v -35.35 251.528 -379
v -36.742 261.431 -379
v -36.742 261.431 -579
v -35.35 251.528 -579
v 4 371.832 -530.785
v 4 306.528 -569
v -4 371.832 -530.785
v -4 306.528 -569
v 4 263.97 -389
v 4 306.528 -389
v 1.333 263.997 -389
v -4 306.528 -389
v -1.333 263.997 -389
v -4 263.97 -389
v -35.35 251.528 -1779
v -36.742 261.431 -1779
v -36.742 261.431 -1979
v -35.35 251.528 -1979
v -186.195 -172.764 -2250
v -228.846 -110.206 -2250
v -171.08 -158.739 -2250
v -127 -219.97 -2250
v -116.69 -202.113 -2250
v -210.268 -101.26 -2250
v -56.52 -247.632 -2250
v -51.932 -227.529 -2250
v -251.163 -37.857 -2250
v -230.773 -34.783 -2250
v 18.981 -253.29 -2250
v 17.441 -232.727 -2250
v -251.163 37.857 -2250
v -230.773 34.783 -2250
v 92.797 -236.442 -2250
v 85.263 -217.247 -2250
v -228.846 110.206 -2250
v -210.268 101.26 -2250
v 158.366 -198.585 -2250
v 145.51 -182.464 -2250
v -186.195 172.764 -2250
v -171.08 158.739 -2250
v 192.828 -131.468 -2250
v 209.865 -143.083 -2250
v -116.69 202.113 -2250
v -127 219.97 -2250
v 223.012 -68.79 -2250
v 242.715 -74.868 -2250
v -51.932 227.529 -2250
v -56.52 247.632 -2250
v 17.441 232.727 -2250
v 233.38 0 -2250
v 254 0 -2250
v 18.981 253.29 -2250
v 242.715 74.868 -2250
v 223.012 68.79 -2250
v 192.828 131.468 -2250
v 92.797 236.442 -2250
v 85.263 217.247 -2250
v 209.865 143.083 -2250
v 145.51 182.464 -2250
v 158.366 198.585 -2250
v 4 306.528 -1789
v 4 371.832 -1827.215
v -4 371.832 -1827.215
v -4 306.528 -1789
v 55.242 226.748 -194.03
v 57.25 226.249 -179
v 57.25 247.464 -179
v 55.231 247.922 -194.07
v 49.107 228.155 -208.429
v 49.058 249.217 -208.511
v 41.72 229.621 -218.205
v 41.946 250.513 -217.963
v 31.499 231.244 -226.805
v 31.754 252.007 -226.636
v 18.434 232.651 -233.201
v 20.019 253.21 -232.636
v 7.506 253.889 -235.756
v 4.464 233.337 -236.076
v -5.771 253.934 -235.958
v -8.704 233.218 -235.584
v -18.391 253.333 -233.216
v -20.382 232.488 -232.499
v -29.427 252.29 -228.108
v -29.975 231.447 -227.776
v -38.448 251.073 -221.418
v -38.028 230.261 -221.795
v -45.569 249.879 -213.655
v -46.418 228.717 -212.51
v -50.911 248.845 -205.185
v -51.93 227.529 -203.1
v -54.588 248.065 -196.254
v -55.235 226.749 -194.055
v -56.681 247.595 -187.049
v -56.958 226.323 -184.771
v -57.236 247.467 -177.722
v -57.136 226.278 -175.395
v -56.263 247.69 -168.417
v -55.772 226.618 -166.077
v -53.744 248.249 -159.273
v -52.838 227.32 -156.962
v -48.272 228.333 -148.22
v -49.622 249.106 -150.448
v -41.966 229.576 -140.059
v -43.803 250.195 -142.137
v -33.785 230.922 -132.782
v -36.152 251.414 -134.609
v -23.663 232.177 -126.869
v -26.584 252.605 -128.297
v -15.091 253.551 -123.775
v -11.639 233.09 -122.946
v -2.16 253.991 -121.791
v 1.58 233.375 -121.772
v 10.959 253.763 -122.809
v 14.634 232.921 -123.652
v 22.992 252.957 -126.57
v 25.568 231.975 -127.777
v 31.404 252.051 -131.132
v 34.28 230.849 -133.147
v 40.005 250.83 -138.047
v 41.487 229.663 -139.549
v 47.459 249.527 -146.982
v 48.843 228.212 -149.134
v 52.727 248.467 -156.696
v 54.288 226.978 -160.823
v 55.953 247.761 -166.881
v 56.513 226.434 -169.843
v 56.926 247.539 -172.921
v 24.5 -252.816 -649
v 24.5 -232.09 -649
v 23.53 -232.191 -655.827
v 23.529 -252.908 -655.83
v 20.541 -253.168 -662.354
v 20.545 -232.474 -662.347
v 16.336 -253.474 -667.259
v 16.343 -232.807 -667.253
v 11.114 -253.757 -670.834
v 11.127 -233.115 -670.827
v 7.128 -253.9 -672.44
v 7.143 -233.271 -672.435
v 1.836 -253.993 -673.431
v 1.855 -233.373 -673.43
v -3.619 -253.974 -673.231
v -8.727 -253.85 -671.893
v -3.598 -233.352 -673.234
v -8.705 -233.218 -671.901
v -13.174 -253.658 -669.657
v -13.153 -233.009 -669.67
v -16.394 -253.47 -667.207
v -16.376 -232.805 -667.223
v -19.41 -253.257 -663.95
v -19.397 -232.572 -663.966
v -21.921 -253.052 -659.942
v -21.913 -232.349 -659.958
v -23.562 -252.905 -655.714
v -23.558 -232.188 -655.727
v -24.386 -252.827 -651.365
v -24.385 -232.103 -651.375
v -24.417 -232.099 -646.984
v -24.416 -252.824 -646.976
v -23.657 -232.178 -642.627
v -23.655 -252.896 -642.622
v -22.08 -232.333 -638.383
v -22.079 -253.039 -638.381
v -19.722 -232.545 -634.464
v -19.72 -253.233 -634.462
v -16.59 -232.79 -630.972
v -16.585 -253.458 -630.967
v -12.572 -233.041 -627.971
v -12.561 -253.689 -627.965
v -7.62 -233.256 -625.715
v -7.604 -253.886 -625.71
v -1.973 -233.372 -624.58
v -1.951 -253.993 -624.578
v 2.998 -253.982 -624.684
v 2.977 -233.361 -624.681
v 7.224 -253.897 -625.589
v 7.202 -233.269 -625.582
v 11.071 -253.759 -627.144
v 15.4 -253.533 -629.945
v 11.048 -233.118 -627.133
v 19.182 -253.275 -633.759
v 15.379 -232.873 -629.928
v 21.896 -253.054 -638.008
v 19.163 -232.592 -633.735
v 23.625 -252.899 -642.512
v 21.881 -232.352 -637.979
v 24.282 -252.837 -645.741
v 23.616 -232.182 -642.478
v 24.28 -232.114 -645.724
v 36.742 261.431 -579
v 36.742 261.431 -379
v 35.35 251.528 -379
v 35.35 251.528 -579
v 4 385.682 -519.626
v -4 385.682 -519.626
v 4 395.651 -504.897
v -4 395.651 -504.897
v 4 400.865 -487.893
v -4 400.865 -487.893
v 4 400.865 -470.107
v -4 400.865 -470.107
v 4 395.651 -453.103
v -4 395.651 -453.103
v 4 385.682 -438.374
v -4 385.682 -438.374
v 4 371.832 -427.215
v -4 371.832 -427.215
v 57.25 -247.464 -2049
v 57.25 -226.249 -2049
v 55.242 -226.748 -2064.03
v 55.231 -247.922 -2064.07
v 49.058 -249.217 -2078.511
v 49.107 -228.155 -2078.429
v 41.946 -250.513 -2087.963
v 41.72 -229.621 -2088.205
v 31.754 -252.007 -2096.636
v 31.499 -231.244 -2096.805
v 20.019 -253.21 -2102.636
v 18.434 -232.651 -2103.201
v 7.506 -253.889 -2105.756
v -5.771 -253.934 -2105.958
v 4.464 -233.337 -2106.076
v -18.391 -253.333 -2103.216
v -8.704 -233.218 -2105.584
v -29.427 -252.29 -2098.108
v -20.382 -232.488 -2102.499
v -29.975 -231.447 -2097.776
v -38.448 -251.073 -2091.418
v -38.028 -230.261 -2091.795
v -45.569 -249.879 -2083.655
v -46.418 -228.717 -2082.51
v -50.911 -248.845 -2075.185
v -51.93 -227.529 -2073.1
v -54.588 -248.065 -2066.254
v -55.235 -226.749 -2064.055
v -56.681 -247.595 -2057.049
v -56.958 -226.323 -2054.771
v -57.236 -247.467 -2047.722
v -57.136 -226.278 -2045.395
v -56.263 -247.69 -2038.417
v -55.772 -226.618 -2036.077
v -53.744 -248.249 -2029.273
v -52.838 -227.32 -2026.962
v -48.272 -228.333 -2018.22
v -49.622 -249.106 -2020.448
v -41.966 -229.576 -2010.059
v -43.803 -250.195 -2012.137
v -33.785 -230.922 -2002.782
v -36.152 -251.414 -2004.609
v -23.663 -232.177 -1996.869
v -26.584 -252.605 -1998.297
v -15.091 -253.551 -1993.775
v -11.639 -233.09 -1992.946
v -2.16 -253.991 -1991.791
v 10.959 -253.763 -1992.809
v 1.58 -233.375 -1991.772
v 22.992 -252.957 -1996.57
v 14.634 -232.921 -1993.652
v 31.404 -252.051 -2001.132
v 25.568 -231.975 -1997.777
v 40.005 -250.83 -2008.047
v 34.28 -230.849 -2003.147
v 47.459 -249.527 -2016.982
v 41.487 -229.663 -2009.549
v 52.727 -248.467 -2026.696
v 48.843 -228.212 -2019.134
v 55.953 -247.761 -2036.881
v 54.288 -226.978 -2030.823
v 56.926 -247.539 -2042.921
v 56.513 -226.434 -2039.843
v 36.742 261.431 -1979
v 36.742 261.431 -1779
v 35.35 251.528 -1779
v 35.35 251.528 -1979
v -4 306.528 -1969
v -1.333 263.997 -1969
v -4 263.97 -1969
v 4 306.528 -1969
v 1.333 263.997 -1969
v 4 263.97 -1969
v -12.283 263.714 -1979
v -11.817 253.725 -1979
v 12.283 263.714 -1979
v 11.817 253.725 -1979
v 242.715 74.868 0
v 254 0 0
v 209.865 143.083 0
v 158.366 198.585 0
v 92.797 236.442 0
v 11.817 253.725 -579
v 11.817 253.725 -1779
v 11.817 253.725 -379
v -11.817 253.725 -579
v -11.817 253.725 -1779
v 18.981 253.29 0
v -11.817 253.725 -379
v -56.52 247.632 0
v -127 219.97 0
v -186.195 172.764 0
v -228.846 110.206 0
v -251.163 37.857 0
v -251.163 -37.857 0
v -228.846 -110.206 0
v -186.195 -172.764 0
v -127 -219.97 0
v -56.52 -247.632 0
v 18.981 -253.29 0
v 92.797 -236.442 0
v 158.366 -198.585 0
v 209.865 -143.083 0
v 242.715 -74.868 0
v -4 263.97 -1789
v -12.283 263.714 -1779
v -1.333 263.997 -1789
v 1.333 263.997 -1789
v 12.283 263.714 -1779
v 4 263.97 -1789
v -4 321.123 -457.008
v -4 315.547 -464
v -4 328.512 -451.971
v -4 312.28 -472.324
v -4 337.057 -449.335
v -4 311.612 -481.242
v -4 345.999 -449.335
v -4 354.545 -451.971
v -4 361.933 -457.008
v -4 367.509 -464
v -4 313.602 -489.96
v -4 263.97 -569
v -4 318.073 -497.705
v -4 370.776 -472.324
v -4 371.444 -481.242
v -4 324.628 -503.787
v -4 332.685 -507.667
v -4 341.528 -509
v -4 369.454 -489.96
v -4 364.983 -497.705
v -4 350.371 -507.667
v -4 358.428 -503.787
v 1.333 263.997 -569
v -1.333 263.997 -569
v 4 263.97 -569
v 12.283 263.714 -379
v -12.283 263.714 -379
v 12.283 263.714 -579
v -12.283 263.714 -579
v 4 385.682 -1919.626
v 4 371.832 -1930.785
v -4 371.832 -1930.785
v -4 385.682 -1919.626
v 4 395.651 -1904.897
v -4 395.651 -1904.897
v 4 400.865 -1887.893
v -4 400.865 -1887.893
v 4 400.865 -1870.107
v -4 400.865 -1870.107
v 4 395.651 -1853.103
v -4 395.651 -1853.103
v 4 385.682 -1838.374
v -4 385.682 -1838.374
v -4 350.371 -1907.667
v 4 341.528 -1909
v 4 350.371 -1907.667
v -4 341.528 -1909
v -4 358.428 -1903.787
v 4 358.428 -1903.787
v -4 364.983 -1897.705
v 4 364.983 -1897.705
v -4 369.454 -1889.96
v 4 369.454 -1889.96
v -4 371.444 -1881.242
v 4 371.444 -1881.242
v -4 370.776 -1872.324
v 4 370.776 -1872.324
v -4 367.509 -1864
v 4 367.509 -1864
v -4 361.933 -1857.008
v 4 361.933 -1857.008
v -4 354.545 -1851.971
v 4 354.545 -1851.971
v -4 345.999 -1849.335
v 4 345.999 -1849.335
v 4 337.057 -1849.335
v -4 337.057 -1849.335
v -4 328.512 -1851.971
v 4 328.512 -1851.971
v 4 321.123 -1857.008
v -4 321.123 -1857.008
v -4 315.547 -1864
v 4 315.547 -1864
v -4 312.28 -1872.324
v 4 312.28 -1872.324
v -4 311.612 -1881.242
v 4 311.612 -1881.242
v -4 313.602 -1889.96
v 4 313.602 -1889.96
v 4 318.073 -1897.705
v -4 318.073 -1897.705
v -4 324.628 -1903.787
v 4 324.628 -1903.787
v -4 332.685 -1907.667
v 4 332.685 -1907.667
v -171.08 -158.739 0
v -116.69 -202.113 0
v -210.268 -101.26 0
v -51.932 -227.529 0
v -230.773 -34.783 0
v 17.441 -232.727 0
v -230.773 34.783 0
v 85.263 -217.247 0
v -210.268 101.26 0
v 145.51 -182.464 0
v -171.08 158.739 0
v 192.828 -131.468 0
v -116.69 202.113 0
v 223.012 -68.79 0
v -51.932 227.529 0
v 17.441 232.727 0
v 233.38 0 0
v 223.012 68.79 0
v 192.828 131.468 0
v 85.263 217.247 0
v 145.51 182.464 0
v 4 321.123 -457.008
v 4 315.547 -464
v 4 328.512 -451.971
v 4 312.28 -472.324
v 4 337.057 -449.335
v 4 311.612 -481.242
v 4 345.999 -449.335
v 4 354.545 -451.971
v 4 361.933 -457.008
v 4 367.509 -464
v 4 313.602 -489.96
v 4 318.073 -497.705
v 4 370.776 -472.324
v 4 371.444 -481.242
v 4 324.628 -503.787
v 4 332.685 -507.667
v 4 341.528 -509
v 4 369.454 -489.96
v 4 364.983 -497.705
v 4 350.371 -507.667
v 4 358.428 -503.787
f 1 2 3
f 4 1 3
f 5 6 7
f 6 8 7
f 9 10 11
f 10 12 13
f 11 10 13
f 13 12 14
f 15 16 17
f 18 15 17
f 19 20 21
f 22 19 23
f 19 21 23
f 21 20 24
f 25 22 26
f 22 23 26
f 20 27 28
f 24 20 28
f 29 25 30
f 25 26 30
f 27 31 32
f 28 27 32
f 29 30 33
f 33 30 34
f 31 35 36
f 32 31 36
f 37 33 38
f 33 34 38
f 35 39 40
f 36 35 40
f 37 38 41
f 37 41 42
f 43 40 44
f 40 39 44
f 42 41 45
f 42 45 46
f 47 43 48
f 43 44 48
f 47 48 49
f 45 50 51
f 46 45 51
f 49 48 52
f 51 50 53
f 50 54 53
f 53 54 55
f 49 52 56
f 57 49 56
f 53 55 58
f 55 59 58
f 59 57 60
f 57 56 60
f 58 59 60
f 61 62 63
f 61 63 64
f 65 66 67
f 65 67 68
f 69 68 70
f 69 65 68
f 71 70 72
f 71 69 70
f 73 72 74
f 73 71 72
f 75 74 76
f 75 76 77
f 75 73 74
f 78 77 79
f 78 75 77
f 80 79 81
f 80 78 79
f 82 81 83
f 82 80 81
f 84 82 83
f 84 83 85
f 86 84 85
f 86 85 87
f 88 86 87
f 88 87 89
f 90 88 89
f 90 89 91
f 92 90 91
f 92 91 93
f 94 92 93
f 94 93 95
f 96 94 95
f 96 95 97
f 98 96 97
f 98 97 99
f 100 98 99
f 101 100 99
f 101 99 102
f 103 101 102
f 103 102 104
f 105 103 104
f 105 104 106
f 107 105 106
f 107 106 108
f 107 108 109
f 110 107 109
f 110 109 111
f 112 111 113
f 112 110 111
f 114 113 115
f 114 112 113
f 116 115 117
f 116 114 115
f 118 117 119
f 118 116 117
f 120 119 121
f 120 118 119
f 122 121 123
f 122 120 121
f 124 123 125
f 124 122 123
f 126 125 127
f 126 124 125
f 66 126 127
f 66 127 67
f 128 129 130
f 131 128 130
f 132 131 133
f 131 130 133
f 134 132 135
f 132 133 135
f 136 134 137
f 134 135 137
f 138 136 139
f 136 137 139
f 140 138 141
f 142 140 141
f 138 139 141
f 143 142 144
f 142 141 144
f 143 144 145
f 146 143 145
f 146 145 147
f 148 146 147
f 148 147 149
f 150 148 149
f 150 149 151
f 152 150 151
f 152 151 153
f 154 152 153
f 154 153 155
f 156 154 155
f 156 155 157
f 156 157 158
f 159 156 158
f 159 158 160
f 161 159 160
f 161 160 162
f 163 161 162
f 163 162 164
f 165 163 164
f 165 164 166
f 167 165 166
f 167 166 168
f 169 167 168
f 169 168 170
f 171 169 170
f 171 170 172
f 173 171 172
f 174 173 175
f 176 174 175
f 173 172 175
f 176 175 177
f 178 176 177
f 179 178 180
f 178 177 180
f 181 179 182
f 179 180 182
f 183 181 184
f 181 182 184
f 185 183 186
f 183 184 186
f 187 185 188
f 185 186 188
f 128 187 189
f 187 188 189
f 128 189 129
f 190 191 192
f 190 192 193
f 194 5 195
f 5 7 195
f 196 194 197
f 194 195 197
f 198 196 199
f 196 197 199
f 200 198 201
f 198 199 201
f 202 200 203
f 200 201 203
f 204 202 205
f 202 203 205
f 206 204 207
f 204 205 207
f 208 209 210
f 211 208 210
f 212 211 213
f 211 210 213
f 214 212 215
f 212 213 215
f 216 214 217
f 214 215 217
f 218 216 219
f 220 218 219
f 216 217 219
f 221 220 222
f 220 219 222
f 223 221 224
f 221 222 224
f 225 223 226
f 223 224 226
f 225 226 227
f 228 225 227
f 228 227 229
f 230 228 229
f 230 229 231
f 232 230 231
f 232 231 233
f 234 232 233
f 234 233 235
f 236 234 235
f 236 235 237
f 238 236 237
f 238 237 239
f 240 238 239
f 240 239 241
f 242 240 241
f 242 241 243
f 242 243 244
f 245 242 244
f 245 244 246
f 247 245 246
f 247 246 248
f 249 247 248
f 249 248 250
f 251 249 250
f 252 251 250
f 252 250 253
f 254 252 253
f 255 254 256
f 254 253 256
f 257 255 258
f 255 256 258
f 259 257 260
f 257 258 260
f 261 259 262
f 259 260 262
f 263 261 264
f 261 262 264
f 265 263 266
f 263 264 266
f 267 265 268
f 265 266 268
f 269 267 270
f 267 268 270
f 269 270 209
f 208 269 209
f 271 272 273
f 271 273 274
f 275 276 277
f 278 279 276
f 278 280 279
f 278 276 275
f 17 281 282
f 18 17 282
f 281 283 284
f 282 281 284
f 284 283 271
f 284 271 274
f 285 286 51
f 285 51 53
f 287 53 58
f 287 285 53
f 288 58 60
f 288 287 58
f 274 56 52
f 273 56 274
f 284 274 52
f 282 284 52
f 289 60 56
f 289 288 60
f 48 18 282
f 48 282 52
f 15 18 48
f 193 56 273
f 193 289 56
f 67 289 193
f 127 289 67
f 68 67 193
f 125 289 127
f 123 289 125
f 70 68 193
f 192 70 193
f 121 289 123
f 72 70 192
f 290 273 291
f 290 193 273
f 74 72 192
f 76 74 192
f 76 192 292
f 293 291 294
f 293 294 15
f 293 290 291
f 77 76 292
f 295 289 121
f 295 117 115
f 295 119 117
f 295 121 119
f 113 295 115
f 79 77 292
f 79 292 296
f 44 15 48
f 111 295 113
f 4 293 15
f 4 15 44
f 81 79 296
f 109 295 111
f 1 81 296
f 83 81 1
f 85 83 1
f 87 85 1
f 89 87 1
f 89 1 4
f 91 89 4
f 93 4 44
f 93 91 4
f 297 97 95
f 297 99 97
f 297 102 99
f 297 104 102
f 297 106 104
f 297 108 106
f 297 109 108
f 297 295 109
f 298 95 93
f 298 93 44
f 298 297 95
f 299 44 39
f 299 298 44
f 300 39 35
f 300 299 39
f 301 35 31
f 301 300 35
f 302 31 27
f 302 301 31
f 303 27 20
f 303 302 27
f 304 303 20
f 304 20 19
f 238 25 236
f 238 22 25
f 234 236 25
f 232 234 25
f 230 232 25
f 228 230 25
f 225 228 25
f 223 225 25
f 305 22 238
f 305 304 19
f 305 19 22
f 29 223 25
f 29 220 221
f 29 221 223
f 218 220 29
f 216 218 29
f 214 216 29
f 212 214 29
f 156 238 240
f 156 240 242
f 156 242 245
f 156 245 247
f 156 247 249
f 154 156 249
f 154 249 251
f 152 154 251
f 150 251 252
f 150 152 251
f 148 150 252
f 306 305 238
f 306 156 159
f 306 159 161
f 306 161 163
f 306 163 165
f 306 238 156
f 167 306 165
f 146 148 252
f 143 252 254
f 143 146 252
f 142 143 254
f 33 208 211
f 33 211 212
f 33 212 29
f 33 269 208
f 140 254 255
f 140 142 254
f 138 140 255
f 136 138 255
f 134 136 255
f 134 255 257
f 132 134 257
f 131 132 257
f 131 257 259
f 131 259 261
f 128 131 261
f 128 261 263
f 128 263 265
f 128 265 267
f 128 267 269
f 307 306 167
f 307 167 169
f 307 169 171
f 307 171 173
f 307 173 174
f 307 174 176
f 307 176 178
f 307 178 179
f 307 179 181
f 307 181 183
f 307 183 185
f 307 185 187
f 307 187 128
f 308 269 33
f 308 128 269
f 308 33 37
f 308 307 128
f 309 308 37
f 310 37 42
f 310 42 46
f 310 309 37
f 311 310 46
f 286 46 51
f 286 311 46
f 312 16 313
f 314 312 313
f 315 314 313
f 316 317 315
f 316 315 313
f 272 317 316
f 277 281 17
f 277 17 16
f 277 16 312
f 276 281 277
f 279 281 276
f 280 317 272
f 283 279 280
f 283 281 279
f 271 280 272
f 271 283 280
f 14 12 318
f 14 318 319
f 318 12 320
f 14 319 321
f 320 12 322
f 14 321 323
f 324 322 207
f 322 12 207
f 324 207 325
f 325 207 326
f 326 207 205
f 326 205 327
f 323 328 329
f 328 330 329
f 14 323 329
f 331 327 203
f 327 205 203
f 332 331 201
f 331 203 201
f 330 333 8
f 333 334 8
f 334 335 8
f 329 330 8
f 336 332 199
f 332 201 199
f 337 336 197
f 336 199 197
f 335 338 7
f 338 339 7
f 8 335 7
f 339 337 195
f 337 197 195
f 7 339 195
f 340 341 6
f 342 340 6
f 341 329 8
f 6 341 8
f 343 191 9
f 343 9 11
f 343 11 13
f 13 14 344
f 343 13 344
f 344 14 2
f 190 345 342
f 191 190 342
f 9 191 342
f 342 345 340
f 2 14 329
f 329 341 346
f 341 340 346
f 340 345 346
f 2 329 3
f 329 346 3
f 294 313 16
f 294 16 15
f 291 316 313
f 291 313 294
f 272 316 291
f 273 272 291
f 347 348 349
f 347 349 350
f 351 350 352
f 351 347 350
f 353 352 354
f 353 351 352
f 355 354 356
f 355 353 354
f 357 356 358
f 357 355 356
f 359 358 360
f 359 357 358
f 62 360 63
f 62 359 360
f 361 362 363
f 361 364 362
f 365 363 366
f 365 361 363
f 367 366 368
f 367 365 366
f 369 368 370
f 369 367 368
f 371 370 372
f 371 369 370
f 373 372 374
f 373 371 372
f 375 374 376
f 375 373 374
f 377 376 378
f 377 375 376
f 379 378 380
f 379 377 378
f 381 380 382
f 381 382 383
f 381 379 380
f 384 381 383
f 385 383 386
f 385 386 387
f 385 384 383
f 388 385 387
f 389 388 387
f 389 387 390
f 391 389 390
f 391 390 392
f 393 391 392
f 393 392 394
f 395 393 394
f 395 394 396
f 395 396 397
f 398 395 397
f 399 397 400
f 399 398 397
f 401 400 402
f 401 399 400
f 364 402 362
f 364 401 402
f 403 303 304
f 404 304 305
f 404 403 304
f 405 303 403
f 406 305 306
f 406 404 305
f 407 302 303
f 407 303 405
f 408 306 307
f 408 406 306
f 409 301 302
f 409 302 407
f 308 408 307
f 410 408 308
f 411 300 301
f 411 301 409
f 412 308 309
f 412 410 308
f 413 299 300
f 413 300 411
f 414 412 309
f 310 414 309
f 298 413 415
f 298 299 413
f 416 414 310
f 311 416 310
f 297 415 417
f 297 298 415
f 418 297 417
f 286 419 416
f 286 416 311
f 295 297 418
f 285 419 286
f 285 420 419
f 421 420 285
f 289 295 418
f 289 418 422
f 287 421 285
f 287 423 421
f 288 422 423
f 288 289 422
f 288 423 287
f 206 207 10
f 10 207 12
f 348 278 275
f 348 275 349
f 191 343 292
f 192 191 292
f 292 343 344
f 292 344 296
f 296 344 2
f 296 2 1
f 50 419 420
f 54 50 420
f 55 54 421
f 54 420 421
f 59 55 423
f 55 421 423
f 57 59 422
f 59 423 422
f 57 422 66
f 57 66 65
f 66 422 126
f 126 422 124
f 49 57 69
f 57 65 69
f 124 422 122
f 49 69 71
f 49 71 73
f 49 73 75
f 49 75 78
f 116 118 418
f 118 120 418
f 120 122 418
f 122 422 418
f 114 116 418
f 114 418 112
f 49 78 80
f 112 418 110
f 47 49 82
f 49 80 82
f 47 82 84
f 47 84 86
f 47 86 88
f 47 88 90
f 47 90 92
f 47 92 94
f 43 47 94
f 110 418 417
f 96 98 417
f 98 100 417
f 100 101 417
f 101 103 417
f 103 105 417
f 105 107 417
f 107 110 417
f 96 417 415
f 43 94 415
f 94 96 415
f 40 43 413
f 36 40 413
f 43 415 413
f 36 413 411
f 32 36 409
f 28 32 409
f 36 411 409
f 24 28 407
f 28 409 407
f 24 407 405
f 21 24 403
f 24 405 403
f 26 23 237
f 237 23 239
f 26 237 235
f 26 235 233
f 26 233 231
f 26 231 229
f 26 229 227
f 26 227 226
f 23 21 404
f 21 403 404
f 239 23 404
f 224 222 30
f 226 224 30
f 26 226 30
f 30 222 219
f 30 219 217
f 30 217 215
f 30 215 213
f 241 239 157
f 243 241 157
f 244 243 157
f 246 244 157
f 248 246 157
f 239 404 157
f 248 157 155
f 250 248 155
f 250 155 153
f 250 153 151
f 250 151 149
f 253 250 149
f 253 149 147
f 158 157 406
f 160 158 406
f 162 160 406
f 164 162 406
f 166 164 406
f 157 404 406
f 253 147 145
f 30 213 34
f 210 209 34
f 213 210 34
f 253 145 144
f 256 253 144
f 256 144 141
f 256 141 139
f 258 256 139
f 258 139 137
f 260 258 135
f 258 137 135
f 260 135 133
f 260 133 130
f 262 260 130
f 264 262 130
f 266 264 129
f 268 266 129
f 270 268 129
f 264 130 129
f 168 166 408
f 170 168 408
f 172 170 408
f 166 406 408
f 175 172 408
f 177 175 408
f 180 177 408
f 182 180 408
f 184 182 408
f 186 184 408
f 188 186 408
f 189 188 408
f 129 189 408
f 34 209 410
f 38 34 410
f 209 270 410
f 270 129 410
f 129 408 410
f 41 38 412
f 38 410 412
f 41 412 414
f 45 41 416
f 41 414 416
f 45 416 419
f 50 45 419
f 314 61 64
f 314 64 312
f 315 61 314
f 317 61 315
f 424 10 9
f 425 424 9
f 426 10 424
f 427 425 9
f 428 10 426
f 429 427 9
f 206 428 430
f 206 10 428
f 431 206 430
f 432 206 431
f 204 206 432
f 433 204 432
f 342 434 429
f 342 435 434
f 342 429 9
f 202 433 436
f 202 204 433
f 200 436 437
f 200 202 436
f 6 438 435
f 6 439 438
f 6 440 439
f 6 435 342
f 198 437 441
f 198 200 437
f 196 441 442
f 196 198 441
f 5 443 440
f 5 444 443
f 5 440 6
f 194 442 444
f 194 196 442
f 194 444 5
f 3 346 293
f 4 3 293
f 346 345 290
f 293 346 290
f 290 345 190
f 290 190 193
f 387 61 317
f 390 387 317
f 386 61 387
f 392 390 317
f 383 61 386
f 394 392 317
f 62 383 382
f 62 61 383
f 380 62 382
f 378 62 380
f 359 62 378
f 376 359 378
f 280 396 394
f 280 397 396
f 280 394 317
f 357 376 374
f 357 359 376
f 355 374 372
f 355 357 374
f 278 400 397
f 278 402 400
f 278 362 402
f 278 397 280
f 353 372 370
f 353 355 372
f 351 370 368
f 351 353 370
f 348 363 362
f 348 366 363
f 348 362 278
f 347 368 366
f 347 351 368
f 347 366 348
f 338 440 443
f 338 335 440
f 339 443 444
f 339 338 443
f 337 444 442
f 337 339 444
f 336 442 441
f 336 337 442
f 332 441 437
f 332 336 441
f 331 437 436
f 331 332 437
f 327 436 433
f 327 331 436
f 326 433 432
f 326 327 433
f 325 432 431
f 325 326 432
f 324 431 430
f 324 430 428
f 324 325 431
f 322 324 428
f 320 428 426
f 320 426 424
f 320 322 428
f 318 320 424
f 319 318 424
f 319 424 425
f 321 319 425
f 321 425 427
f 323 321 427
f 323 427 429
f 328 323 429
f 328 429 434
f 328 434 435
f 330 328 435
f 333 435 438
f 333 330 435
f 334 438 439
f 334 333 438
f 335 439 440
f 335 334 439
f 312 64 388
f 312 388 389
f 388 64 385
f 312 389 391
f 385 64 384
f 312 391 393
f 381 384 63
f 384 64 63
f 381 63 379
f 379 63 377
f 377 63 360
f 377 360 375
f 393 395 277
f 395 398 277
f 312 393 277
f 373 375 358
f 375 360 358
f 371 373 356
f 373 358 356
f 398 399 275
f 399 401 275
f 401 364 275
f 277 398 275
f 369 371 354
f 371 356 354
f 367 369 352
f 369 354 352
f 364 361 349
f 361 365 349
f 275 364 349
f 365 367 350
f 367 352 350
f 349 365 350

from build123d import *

# Parameters (mm, degrees)
SKETCH1_R           = 254
SKETCH1_R_2         = 233.38
BOSS_EXTRUDE1_DEPTH = 2250
CUT_EXTRUDE1_REACH  = 256
SKETCH2_R           = 57.25
CUT_EXTRUDE2_REACH  = 256
SKETCH3_R           = 57.25
CUT_EXTRUDE3_REACH  = 256
SKETCH4_R           = 24.5
SKETCH5_W           = 200
SKETCH5_H           = 10
REVOLVE1_ANGLE      = 16
SKETCH6_R           = 30
BOSS_EXTRUDE2_DEPTH = 4


with BuildPart() as part:
    # Sketch1 → Boss-Extrude1 (new body)
    with BuildSketch(Plane.XY):
        Circle(SKETCH1_R)
        Circle(SKETCH1_R_2, mode=Mode.SUBTRACT)
    extrude(amount=-BOSS_EXTRUDE1_DEPTH)

    # Sketch2 → Cut-Extrude1 (cut, up to next)
    with BuildSketch(Plane(origin=(0, 0, 0), x_dir=(1, 0, 0), z_dir=(0, 1, 0)), mode=Mode.PRIVATE) as cut_extrude1_sk1:
        with Locations((0, 179)):
            Circle(SKETCH2_R)
    cut_extrude1_tool1 = extrude(cut_extrude1_sk1.sketch, amount=CUT_EXTRUDE1_REACH, mode=Mode.PRIVATE) & part.part
    add(cut_extrude1_tool1.solids().sort_by_distance((0, 0, -179))[0], mode=Mode.SUBTRACT)

    # Sketch3 → Cut-Extrude2 (cut, up to next)
    with BuildSketch(Plane(origin=(0, 0, 0), x_dir=(1, 0, 0), z_dir=(0, 1, 0)), mode=Mode.PRIVATE) as cut_extrude2_sk1:
        with Locations((0, 2049)):
            Circle(SKETCH3_R)
    cut_extrude2_tool1 = extrude(cut_extrude2_sk1.sketch, amount=-CUT_EXTRUDE2_REACH, mode=Mode.PRIVATE) & part.part
    add(cut_extrude2_tool1.solids().sort_by_distance((0, 0, -2049))[0], mode=Mode.SUBTRACT)

    # Sketch4 → Cut-Extrude3 (cut, up to next)
    with BuildSketch(Plane(origin=(0, 0, 0), x_dir=(1, 0, 0), z_dir=(0, 1, 0)), mode=Mode.PRIVATE) as cut_extrude3_sk1:
        with Locations((0, 649)):
            Circle(SKETCH4_R)
    cut_extrude3_tool1 = extrude(cut_extrude3_sk1.sketch, amount=-CUT_EXTRUDE3_REACH, mode=Mode.PRIVATE) & part.part
    add(cut_extrude3_tool1.solids().sort_by_distance((0, 0, -649))[0], mode=Mode.SUBTRACT)

    # Sketch5 → Revolve1 (revolve, symmetric)
    with BuildSketch(Plane(origin=(0, 0, 0), x_dir=(0, 0, -1), z_dir=(1, 0, 0))) as revolve1_sk:
        with Locations((479, 259)):
            Rectangle(SKETCH5_W, SKETCH5_H)
        with Locations((1879, 259)):
            Rectangle(SKETCH5_W, SKETCH5_H)
    revolve(axis=Axis((0, 0, 0), (0, 0, -1)), revolution_arc=REVOLVE1_ANGLE / 2)
    revolve(revolve1_sk.sketch, axis=Axis((0, 0, 0), (0, 0, 1)), revolution_arc=REVOLVE1_ANGLE / 2)

    # Sketch6 → Boss-Extrude2 (add, symmetric)
    with BuildSketch(Plane(origin=(0, 0, 0), x_dir=(0, 0, -1), z_dir=(1, 0, 0))):
        with BuildLine():
            Line((479, 251.52808946), (569, 251.52808946))
            Line((569, 251.52808946), (569, 306.52808946))
            Line((569, 306.52808946), (530.784861392, 371.832018754))
            ThreePointArc((530.784861392, 371.832018754), (479, 401.52808946), (427.215138608, 371.832018754))
            Line((427.215138608, 371.832018754), (389, 306.52808946))
            Line((389, 306.52808946), (389, 251.52808946))
            Line((389, 251.52808946), (479, 251.52808946))
        make_face()
        with Locations((479, 341.52808946)):
            Circle(SKETCH6_R, mode=Mode.SUBTRACT)
        with BuildLine():
            Line((1969, 251.52808946), (1969, 306.52808946))
            Line((1969, 306.52808946), (1930.784861392, 371.832018754))
            ThreePointArc((1930.784861392, 371.832018754), (1879, 401.52808946), (1827.215138608, 371.832018754))
            Line((1827.215138608, 371.832018754), (1789, 306.52808946))
            Line((1789, 306.52808946), (1789, 251.52808946))
            Line((1789, 251.52808946), (1879, 251.52808946))
            Line((1879, 251.52808946), (1969, 251.52808946))
        make_face()
        with Locations((1879, 341.52808946)):
            Circle(SKETCH6_R, mode=Mode.SUBTRACT)
    extrude(amount=BOSS_EXTRUDE2_DEPTH, both=True)


solid = part.part
